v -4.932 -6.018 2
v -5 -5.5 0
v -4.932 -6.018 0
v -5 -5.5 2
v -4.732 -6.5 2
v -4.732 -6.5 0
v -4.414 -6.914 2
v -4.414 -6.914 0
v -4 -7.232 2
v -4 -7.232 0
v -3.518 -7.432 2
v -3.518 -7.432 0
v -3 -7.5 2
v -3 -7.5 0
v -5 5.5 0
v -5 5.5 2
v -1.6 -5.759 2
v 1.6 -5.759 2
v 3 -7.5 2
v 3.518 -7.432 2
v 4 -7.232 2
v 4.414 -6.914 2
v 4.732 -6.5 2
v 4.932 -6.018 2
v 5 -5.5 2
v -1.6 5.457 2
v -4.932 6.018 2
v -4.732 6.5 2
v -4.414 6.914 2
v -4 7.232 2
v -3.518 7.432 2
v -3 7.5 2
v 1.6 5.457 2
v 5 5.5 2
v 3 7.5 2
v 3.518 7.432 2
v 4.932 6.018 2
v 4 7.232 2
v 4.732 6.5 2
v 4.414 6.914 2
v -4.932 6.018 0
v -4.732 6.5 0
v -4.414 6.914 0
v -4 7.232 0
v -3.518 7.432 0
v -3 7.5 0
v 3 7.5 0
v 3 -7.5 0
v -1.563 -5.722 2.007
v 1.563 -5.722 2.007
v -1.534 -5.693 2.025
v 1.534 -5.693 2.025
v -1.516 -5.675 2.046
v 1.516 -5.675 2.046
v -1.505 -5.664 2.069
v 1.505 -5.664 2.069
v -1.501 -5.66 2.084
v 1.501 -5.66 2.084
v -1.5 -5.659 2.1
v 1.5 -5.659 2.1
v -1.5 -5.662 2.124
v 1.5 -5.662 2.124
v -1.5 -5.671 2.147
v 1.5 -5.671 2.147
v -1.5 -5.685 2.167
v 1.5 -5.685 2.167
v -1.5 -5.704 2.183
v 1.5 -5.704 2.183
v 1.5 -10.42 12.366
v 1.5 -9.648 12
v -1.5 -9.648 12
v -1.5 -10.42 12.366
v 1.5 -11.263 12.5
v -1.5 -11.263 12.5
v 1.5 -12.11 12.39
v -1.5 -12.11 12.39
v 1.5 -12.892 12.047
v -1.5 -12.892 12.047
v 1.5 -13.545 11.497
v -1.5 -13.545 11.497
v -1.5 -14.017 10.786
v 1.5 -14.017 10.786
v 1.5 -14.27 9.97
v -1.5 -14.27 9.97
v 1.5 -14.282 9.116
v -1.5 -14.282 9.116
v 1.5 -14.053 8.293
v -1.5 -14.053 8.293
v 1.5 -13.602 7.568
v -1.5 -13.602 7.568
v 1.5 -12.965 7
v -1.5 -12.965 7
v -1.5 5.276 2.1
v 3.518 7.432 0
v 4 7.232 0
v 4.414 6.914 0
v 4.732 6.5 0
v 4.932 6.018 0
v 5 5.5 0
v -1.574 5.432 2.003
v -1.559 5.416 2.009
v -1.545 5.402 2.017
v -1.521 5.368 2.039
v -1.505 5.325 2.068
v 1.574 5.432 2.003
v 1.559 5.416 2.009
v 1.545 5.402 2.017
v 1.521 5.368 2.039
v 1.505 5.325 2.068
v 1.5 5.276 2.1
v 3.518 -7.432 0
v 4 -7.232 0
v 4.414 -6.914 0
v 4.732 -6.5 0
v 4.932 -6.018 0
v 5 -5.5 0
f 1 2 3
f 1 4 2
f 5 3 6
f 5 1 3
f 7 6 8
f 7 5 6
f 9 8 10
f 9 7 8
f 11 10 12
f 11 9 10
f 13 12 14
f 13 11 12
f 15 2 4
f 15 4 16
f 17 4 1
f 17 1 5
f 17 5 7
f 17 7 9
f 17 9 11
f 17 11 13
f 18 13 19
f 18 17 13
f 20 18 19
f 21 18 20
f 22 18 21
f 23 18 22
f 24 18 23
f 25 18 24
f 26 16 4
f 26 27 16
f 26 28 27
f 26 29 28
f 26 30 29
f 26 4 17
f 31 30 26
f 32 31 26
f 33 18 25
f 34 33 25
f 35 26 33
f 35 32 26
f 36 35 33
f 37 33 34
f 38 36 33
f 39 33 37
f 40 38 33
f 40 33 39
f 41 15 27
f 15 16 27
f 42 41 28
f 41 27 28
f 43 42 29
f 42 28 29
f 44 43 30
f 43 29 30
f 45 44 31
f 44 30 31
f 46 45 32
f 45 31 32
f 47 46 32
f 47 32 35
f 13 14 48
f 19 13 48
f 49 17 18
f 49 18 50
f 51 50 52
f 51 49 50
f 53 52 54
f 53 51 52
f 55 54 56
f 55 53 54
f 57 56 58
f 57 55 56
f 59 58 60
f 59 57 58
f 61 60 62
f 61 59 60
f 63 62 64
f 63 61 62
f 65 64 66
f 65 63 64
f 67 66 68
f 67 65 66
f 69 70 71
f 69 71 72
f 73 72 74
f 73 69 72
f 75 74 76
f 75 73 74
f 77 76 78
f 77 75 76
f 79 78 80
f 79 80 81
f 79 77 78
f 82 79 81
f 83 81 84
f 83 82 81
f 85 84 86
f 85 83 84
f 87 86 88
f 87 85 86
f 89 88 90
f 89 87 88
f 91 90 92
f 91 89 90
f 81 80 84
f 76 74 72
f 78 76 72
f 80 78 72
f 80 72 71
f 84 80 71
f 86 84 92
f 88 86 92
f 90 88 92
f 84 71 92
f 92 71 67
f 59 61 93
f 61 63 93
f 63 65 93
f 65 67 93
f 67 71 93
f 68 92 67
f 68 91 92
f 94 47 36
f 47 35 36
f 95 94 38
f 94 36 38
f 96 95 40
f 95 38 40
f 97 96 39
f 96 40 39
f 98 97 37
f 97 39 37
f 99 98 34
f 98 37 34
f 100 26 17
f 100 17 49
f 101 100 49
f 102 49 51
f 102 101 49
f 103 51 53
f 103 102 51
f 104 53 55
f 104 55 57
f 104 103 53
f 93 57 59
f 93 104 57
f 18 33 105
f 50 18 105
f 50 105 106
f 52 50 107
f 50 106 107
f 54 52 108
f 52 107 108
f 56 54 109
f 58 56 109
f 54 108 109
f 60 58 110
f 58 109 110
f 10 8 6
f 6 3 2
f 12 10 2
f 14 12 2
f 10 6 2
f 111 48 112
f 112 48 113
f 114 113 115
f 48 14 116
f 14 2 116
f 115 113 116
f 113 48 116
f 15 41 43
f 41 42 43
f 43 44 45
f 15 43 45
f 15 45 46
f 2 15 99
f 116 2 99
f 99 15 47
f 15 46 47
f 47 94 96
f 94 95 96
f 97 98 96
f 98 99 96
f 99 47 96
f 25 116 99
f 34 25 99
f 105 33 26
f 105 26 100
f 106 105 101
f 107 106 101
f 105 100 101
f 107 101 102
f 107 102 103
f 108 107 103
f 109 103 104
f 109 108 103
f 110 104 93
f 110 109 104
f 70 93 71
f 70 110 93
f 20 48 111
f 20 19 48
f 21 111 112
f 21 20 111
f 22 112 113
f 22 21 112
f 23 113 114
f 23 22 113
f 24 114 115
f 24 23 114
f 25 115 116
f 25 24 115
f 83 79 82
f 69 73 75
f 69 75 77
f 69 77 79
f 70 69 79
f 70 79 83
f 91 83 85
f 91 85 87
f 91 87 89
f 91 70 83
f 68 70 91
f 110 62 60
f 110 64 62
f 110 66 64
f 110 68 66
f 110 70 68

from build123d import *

# Parameters (mm, degrees)
SKETCH1_W           = 10
SKETCH1_H           = 15
BOSS_EXTRUDE1_DEPTH = 2
BOSS_EXTRUDE2_DEPTH = 1.5
FILLET1_R           = 2
FILLET2_R           = 0.1


with BuildPart() as part:
    # Sketch1 → Boss-Extrude1 (new body)
    with BuildSketch(Plane.XY):
        Rectangle(SKETCH1_W, SKETCH1_H)
    extrude(amount=BOSS_EXTRUDE1_DEPTH)

    # Sketch3 → Boss-Extrude2 (add, symmetric)
    with BuildSketch(Plane(origin=(0, 0, 0), x_dir=(0, 0, -1), z_dir=(1, 0, 0))):
        with BuildLine():
            Line((-2, 5.427204202), (-12, -9.648363026))
            ThreePointArc((-12, -9.648363026), (-11.158312395, -13.806675422), (-7, -12.964987817))
            Line((-7, -12.964987817), (-2, -5.427204202))
            Line((-2, -5.427204202), (-2, 5.427204202))
        make_face()
    extrude(amount=BOSS_EXTRUDE2_DEPTH, both=True)

    # Fillet1
    fillet1_edges = [part.edges().sort_by_distance(p)[0] for p in [
        (5, -7.5, 1),
        (-5, -7.5, 1),
        (-5, 7.5, 1),
        (5, 7.5, 1),
    ]]
    fillet(fillet1_edges, radius=FILLET1_R)

    # Fillet2
    fillet2_edges = [part.edges().sort_by_distance(p)[0] for p in [
        (-1.5, 0, 2),
        (0, -5.427204202, 2),
        (0, 5.427204202, 2),
        (1.5, 0, 2),
    ]]
    fillet(fillet2_edges, radius=FILLET2_R)


solid = part.part
